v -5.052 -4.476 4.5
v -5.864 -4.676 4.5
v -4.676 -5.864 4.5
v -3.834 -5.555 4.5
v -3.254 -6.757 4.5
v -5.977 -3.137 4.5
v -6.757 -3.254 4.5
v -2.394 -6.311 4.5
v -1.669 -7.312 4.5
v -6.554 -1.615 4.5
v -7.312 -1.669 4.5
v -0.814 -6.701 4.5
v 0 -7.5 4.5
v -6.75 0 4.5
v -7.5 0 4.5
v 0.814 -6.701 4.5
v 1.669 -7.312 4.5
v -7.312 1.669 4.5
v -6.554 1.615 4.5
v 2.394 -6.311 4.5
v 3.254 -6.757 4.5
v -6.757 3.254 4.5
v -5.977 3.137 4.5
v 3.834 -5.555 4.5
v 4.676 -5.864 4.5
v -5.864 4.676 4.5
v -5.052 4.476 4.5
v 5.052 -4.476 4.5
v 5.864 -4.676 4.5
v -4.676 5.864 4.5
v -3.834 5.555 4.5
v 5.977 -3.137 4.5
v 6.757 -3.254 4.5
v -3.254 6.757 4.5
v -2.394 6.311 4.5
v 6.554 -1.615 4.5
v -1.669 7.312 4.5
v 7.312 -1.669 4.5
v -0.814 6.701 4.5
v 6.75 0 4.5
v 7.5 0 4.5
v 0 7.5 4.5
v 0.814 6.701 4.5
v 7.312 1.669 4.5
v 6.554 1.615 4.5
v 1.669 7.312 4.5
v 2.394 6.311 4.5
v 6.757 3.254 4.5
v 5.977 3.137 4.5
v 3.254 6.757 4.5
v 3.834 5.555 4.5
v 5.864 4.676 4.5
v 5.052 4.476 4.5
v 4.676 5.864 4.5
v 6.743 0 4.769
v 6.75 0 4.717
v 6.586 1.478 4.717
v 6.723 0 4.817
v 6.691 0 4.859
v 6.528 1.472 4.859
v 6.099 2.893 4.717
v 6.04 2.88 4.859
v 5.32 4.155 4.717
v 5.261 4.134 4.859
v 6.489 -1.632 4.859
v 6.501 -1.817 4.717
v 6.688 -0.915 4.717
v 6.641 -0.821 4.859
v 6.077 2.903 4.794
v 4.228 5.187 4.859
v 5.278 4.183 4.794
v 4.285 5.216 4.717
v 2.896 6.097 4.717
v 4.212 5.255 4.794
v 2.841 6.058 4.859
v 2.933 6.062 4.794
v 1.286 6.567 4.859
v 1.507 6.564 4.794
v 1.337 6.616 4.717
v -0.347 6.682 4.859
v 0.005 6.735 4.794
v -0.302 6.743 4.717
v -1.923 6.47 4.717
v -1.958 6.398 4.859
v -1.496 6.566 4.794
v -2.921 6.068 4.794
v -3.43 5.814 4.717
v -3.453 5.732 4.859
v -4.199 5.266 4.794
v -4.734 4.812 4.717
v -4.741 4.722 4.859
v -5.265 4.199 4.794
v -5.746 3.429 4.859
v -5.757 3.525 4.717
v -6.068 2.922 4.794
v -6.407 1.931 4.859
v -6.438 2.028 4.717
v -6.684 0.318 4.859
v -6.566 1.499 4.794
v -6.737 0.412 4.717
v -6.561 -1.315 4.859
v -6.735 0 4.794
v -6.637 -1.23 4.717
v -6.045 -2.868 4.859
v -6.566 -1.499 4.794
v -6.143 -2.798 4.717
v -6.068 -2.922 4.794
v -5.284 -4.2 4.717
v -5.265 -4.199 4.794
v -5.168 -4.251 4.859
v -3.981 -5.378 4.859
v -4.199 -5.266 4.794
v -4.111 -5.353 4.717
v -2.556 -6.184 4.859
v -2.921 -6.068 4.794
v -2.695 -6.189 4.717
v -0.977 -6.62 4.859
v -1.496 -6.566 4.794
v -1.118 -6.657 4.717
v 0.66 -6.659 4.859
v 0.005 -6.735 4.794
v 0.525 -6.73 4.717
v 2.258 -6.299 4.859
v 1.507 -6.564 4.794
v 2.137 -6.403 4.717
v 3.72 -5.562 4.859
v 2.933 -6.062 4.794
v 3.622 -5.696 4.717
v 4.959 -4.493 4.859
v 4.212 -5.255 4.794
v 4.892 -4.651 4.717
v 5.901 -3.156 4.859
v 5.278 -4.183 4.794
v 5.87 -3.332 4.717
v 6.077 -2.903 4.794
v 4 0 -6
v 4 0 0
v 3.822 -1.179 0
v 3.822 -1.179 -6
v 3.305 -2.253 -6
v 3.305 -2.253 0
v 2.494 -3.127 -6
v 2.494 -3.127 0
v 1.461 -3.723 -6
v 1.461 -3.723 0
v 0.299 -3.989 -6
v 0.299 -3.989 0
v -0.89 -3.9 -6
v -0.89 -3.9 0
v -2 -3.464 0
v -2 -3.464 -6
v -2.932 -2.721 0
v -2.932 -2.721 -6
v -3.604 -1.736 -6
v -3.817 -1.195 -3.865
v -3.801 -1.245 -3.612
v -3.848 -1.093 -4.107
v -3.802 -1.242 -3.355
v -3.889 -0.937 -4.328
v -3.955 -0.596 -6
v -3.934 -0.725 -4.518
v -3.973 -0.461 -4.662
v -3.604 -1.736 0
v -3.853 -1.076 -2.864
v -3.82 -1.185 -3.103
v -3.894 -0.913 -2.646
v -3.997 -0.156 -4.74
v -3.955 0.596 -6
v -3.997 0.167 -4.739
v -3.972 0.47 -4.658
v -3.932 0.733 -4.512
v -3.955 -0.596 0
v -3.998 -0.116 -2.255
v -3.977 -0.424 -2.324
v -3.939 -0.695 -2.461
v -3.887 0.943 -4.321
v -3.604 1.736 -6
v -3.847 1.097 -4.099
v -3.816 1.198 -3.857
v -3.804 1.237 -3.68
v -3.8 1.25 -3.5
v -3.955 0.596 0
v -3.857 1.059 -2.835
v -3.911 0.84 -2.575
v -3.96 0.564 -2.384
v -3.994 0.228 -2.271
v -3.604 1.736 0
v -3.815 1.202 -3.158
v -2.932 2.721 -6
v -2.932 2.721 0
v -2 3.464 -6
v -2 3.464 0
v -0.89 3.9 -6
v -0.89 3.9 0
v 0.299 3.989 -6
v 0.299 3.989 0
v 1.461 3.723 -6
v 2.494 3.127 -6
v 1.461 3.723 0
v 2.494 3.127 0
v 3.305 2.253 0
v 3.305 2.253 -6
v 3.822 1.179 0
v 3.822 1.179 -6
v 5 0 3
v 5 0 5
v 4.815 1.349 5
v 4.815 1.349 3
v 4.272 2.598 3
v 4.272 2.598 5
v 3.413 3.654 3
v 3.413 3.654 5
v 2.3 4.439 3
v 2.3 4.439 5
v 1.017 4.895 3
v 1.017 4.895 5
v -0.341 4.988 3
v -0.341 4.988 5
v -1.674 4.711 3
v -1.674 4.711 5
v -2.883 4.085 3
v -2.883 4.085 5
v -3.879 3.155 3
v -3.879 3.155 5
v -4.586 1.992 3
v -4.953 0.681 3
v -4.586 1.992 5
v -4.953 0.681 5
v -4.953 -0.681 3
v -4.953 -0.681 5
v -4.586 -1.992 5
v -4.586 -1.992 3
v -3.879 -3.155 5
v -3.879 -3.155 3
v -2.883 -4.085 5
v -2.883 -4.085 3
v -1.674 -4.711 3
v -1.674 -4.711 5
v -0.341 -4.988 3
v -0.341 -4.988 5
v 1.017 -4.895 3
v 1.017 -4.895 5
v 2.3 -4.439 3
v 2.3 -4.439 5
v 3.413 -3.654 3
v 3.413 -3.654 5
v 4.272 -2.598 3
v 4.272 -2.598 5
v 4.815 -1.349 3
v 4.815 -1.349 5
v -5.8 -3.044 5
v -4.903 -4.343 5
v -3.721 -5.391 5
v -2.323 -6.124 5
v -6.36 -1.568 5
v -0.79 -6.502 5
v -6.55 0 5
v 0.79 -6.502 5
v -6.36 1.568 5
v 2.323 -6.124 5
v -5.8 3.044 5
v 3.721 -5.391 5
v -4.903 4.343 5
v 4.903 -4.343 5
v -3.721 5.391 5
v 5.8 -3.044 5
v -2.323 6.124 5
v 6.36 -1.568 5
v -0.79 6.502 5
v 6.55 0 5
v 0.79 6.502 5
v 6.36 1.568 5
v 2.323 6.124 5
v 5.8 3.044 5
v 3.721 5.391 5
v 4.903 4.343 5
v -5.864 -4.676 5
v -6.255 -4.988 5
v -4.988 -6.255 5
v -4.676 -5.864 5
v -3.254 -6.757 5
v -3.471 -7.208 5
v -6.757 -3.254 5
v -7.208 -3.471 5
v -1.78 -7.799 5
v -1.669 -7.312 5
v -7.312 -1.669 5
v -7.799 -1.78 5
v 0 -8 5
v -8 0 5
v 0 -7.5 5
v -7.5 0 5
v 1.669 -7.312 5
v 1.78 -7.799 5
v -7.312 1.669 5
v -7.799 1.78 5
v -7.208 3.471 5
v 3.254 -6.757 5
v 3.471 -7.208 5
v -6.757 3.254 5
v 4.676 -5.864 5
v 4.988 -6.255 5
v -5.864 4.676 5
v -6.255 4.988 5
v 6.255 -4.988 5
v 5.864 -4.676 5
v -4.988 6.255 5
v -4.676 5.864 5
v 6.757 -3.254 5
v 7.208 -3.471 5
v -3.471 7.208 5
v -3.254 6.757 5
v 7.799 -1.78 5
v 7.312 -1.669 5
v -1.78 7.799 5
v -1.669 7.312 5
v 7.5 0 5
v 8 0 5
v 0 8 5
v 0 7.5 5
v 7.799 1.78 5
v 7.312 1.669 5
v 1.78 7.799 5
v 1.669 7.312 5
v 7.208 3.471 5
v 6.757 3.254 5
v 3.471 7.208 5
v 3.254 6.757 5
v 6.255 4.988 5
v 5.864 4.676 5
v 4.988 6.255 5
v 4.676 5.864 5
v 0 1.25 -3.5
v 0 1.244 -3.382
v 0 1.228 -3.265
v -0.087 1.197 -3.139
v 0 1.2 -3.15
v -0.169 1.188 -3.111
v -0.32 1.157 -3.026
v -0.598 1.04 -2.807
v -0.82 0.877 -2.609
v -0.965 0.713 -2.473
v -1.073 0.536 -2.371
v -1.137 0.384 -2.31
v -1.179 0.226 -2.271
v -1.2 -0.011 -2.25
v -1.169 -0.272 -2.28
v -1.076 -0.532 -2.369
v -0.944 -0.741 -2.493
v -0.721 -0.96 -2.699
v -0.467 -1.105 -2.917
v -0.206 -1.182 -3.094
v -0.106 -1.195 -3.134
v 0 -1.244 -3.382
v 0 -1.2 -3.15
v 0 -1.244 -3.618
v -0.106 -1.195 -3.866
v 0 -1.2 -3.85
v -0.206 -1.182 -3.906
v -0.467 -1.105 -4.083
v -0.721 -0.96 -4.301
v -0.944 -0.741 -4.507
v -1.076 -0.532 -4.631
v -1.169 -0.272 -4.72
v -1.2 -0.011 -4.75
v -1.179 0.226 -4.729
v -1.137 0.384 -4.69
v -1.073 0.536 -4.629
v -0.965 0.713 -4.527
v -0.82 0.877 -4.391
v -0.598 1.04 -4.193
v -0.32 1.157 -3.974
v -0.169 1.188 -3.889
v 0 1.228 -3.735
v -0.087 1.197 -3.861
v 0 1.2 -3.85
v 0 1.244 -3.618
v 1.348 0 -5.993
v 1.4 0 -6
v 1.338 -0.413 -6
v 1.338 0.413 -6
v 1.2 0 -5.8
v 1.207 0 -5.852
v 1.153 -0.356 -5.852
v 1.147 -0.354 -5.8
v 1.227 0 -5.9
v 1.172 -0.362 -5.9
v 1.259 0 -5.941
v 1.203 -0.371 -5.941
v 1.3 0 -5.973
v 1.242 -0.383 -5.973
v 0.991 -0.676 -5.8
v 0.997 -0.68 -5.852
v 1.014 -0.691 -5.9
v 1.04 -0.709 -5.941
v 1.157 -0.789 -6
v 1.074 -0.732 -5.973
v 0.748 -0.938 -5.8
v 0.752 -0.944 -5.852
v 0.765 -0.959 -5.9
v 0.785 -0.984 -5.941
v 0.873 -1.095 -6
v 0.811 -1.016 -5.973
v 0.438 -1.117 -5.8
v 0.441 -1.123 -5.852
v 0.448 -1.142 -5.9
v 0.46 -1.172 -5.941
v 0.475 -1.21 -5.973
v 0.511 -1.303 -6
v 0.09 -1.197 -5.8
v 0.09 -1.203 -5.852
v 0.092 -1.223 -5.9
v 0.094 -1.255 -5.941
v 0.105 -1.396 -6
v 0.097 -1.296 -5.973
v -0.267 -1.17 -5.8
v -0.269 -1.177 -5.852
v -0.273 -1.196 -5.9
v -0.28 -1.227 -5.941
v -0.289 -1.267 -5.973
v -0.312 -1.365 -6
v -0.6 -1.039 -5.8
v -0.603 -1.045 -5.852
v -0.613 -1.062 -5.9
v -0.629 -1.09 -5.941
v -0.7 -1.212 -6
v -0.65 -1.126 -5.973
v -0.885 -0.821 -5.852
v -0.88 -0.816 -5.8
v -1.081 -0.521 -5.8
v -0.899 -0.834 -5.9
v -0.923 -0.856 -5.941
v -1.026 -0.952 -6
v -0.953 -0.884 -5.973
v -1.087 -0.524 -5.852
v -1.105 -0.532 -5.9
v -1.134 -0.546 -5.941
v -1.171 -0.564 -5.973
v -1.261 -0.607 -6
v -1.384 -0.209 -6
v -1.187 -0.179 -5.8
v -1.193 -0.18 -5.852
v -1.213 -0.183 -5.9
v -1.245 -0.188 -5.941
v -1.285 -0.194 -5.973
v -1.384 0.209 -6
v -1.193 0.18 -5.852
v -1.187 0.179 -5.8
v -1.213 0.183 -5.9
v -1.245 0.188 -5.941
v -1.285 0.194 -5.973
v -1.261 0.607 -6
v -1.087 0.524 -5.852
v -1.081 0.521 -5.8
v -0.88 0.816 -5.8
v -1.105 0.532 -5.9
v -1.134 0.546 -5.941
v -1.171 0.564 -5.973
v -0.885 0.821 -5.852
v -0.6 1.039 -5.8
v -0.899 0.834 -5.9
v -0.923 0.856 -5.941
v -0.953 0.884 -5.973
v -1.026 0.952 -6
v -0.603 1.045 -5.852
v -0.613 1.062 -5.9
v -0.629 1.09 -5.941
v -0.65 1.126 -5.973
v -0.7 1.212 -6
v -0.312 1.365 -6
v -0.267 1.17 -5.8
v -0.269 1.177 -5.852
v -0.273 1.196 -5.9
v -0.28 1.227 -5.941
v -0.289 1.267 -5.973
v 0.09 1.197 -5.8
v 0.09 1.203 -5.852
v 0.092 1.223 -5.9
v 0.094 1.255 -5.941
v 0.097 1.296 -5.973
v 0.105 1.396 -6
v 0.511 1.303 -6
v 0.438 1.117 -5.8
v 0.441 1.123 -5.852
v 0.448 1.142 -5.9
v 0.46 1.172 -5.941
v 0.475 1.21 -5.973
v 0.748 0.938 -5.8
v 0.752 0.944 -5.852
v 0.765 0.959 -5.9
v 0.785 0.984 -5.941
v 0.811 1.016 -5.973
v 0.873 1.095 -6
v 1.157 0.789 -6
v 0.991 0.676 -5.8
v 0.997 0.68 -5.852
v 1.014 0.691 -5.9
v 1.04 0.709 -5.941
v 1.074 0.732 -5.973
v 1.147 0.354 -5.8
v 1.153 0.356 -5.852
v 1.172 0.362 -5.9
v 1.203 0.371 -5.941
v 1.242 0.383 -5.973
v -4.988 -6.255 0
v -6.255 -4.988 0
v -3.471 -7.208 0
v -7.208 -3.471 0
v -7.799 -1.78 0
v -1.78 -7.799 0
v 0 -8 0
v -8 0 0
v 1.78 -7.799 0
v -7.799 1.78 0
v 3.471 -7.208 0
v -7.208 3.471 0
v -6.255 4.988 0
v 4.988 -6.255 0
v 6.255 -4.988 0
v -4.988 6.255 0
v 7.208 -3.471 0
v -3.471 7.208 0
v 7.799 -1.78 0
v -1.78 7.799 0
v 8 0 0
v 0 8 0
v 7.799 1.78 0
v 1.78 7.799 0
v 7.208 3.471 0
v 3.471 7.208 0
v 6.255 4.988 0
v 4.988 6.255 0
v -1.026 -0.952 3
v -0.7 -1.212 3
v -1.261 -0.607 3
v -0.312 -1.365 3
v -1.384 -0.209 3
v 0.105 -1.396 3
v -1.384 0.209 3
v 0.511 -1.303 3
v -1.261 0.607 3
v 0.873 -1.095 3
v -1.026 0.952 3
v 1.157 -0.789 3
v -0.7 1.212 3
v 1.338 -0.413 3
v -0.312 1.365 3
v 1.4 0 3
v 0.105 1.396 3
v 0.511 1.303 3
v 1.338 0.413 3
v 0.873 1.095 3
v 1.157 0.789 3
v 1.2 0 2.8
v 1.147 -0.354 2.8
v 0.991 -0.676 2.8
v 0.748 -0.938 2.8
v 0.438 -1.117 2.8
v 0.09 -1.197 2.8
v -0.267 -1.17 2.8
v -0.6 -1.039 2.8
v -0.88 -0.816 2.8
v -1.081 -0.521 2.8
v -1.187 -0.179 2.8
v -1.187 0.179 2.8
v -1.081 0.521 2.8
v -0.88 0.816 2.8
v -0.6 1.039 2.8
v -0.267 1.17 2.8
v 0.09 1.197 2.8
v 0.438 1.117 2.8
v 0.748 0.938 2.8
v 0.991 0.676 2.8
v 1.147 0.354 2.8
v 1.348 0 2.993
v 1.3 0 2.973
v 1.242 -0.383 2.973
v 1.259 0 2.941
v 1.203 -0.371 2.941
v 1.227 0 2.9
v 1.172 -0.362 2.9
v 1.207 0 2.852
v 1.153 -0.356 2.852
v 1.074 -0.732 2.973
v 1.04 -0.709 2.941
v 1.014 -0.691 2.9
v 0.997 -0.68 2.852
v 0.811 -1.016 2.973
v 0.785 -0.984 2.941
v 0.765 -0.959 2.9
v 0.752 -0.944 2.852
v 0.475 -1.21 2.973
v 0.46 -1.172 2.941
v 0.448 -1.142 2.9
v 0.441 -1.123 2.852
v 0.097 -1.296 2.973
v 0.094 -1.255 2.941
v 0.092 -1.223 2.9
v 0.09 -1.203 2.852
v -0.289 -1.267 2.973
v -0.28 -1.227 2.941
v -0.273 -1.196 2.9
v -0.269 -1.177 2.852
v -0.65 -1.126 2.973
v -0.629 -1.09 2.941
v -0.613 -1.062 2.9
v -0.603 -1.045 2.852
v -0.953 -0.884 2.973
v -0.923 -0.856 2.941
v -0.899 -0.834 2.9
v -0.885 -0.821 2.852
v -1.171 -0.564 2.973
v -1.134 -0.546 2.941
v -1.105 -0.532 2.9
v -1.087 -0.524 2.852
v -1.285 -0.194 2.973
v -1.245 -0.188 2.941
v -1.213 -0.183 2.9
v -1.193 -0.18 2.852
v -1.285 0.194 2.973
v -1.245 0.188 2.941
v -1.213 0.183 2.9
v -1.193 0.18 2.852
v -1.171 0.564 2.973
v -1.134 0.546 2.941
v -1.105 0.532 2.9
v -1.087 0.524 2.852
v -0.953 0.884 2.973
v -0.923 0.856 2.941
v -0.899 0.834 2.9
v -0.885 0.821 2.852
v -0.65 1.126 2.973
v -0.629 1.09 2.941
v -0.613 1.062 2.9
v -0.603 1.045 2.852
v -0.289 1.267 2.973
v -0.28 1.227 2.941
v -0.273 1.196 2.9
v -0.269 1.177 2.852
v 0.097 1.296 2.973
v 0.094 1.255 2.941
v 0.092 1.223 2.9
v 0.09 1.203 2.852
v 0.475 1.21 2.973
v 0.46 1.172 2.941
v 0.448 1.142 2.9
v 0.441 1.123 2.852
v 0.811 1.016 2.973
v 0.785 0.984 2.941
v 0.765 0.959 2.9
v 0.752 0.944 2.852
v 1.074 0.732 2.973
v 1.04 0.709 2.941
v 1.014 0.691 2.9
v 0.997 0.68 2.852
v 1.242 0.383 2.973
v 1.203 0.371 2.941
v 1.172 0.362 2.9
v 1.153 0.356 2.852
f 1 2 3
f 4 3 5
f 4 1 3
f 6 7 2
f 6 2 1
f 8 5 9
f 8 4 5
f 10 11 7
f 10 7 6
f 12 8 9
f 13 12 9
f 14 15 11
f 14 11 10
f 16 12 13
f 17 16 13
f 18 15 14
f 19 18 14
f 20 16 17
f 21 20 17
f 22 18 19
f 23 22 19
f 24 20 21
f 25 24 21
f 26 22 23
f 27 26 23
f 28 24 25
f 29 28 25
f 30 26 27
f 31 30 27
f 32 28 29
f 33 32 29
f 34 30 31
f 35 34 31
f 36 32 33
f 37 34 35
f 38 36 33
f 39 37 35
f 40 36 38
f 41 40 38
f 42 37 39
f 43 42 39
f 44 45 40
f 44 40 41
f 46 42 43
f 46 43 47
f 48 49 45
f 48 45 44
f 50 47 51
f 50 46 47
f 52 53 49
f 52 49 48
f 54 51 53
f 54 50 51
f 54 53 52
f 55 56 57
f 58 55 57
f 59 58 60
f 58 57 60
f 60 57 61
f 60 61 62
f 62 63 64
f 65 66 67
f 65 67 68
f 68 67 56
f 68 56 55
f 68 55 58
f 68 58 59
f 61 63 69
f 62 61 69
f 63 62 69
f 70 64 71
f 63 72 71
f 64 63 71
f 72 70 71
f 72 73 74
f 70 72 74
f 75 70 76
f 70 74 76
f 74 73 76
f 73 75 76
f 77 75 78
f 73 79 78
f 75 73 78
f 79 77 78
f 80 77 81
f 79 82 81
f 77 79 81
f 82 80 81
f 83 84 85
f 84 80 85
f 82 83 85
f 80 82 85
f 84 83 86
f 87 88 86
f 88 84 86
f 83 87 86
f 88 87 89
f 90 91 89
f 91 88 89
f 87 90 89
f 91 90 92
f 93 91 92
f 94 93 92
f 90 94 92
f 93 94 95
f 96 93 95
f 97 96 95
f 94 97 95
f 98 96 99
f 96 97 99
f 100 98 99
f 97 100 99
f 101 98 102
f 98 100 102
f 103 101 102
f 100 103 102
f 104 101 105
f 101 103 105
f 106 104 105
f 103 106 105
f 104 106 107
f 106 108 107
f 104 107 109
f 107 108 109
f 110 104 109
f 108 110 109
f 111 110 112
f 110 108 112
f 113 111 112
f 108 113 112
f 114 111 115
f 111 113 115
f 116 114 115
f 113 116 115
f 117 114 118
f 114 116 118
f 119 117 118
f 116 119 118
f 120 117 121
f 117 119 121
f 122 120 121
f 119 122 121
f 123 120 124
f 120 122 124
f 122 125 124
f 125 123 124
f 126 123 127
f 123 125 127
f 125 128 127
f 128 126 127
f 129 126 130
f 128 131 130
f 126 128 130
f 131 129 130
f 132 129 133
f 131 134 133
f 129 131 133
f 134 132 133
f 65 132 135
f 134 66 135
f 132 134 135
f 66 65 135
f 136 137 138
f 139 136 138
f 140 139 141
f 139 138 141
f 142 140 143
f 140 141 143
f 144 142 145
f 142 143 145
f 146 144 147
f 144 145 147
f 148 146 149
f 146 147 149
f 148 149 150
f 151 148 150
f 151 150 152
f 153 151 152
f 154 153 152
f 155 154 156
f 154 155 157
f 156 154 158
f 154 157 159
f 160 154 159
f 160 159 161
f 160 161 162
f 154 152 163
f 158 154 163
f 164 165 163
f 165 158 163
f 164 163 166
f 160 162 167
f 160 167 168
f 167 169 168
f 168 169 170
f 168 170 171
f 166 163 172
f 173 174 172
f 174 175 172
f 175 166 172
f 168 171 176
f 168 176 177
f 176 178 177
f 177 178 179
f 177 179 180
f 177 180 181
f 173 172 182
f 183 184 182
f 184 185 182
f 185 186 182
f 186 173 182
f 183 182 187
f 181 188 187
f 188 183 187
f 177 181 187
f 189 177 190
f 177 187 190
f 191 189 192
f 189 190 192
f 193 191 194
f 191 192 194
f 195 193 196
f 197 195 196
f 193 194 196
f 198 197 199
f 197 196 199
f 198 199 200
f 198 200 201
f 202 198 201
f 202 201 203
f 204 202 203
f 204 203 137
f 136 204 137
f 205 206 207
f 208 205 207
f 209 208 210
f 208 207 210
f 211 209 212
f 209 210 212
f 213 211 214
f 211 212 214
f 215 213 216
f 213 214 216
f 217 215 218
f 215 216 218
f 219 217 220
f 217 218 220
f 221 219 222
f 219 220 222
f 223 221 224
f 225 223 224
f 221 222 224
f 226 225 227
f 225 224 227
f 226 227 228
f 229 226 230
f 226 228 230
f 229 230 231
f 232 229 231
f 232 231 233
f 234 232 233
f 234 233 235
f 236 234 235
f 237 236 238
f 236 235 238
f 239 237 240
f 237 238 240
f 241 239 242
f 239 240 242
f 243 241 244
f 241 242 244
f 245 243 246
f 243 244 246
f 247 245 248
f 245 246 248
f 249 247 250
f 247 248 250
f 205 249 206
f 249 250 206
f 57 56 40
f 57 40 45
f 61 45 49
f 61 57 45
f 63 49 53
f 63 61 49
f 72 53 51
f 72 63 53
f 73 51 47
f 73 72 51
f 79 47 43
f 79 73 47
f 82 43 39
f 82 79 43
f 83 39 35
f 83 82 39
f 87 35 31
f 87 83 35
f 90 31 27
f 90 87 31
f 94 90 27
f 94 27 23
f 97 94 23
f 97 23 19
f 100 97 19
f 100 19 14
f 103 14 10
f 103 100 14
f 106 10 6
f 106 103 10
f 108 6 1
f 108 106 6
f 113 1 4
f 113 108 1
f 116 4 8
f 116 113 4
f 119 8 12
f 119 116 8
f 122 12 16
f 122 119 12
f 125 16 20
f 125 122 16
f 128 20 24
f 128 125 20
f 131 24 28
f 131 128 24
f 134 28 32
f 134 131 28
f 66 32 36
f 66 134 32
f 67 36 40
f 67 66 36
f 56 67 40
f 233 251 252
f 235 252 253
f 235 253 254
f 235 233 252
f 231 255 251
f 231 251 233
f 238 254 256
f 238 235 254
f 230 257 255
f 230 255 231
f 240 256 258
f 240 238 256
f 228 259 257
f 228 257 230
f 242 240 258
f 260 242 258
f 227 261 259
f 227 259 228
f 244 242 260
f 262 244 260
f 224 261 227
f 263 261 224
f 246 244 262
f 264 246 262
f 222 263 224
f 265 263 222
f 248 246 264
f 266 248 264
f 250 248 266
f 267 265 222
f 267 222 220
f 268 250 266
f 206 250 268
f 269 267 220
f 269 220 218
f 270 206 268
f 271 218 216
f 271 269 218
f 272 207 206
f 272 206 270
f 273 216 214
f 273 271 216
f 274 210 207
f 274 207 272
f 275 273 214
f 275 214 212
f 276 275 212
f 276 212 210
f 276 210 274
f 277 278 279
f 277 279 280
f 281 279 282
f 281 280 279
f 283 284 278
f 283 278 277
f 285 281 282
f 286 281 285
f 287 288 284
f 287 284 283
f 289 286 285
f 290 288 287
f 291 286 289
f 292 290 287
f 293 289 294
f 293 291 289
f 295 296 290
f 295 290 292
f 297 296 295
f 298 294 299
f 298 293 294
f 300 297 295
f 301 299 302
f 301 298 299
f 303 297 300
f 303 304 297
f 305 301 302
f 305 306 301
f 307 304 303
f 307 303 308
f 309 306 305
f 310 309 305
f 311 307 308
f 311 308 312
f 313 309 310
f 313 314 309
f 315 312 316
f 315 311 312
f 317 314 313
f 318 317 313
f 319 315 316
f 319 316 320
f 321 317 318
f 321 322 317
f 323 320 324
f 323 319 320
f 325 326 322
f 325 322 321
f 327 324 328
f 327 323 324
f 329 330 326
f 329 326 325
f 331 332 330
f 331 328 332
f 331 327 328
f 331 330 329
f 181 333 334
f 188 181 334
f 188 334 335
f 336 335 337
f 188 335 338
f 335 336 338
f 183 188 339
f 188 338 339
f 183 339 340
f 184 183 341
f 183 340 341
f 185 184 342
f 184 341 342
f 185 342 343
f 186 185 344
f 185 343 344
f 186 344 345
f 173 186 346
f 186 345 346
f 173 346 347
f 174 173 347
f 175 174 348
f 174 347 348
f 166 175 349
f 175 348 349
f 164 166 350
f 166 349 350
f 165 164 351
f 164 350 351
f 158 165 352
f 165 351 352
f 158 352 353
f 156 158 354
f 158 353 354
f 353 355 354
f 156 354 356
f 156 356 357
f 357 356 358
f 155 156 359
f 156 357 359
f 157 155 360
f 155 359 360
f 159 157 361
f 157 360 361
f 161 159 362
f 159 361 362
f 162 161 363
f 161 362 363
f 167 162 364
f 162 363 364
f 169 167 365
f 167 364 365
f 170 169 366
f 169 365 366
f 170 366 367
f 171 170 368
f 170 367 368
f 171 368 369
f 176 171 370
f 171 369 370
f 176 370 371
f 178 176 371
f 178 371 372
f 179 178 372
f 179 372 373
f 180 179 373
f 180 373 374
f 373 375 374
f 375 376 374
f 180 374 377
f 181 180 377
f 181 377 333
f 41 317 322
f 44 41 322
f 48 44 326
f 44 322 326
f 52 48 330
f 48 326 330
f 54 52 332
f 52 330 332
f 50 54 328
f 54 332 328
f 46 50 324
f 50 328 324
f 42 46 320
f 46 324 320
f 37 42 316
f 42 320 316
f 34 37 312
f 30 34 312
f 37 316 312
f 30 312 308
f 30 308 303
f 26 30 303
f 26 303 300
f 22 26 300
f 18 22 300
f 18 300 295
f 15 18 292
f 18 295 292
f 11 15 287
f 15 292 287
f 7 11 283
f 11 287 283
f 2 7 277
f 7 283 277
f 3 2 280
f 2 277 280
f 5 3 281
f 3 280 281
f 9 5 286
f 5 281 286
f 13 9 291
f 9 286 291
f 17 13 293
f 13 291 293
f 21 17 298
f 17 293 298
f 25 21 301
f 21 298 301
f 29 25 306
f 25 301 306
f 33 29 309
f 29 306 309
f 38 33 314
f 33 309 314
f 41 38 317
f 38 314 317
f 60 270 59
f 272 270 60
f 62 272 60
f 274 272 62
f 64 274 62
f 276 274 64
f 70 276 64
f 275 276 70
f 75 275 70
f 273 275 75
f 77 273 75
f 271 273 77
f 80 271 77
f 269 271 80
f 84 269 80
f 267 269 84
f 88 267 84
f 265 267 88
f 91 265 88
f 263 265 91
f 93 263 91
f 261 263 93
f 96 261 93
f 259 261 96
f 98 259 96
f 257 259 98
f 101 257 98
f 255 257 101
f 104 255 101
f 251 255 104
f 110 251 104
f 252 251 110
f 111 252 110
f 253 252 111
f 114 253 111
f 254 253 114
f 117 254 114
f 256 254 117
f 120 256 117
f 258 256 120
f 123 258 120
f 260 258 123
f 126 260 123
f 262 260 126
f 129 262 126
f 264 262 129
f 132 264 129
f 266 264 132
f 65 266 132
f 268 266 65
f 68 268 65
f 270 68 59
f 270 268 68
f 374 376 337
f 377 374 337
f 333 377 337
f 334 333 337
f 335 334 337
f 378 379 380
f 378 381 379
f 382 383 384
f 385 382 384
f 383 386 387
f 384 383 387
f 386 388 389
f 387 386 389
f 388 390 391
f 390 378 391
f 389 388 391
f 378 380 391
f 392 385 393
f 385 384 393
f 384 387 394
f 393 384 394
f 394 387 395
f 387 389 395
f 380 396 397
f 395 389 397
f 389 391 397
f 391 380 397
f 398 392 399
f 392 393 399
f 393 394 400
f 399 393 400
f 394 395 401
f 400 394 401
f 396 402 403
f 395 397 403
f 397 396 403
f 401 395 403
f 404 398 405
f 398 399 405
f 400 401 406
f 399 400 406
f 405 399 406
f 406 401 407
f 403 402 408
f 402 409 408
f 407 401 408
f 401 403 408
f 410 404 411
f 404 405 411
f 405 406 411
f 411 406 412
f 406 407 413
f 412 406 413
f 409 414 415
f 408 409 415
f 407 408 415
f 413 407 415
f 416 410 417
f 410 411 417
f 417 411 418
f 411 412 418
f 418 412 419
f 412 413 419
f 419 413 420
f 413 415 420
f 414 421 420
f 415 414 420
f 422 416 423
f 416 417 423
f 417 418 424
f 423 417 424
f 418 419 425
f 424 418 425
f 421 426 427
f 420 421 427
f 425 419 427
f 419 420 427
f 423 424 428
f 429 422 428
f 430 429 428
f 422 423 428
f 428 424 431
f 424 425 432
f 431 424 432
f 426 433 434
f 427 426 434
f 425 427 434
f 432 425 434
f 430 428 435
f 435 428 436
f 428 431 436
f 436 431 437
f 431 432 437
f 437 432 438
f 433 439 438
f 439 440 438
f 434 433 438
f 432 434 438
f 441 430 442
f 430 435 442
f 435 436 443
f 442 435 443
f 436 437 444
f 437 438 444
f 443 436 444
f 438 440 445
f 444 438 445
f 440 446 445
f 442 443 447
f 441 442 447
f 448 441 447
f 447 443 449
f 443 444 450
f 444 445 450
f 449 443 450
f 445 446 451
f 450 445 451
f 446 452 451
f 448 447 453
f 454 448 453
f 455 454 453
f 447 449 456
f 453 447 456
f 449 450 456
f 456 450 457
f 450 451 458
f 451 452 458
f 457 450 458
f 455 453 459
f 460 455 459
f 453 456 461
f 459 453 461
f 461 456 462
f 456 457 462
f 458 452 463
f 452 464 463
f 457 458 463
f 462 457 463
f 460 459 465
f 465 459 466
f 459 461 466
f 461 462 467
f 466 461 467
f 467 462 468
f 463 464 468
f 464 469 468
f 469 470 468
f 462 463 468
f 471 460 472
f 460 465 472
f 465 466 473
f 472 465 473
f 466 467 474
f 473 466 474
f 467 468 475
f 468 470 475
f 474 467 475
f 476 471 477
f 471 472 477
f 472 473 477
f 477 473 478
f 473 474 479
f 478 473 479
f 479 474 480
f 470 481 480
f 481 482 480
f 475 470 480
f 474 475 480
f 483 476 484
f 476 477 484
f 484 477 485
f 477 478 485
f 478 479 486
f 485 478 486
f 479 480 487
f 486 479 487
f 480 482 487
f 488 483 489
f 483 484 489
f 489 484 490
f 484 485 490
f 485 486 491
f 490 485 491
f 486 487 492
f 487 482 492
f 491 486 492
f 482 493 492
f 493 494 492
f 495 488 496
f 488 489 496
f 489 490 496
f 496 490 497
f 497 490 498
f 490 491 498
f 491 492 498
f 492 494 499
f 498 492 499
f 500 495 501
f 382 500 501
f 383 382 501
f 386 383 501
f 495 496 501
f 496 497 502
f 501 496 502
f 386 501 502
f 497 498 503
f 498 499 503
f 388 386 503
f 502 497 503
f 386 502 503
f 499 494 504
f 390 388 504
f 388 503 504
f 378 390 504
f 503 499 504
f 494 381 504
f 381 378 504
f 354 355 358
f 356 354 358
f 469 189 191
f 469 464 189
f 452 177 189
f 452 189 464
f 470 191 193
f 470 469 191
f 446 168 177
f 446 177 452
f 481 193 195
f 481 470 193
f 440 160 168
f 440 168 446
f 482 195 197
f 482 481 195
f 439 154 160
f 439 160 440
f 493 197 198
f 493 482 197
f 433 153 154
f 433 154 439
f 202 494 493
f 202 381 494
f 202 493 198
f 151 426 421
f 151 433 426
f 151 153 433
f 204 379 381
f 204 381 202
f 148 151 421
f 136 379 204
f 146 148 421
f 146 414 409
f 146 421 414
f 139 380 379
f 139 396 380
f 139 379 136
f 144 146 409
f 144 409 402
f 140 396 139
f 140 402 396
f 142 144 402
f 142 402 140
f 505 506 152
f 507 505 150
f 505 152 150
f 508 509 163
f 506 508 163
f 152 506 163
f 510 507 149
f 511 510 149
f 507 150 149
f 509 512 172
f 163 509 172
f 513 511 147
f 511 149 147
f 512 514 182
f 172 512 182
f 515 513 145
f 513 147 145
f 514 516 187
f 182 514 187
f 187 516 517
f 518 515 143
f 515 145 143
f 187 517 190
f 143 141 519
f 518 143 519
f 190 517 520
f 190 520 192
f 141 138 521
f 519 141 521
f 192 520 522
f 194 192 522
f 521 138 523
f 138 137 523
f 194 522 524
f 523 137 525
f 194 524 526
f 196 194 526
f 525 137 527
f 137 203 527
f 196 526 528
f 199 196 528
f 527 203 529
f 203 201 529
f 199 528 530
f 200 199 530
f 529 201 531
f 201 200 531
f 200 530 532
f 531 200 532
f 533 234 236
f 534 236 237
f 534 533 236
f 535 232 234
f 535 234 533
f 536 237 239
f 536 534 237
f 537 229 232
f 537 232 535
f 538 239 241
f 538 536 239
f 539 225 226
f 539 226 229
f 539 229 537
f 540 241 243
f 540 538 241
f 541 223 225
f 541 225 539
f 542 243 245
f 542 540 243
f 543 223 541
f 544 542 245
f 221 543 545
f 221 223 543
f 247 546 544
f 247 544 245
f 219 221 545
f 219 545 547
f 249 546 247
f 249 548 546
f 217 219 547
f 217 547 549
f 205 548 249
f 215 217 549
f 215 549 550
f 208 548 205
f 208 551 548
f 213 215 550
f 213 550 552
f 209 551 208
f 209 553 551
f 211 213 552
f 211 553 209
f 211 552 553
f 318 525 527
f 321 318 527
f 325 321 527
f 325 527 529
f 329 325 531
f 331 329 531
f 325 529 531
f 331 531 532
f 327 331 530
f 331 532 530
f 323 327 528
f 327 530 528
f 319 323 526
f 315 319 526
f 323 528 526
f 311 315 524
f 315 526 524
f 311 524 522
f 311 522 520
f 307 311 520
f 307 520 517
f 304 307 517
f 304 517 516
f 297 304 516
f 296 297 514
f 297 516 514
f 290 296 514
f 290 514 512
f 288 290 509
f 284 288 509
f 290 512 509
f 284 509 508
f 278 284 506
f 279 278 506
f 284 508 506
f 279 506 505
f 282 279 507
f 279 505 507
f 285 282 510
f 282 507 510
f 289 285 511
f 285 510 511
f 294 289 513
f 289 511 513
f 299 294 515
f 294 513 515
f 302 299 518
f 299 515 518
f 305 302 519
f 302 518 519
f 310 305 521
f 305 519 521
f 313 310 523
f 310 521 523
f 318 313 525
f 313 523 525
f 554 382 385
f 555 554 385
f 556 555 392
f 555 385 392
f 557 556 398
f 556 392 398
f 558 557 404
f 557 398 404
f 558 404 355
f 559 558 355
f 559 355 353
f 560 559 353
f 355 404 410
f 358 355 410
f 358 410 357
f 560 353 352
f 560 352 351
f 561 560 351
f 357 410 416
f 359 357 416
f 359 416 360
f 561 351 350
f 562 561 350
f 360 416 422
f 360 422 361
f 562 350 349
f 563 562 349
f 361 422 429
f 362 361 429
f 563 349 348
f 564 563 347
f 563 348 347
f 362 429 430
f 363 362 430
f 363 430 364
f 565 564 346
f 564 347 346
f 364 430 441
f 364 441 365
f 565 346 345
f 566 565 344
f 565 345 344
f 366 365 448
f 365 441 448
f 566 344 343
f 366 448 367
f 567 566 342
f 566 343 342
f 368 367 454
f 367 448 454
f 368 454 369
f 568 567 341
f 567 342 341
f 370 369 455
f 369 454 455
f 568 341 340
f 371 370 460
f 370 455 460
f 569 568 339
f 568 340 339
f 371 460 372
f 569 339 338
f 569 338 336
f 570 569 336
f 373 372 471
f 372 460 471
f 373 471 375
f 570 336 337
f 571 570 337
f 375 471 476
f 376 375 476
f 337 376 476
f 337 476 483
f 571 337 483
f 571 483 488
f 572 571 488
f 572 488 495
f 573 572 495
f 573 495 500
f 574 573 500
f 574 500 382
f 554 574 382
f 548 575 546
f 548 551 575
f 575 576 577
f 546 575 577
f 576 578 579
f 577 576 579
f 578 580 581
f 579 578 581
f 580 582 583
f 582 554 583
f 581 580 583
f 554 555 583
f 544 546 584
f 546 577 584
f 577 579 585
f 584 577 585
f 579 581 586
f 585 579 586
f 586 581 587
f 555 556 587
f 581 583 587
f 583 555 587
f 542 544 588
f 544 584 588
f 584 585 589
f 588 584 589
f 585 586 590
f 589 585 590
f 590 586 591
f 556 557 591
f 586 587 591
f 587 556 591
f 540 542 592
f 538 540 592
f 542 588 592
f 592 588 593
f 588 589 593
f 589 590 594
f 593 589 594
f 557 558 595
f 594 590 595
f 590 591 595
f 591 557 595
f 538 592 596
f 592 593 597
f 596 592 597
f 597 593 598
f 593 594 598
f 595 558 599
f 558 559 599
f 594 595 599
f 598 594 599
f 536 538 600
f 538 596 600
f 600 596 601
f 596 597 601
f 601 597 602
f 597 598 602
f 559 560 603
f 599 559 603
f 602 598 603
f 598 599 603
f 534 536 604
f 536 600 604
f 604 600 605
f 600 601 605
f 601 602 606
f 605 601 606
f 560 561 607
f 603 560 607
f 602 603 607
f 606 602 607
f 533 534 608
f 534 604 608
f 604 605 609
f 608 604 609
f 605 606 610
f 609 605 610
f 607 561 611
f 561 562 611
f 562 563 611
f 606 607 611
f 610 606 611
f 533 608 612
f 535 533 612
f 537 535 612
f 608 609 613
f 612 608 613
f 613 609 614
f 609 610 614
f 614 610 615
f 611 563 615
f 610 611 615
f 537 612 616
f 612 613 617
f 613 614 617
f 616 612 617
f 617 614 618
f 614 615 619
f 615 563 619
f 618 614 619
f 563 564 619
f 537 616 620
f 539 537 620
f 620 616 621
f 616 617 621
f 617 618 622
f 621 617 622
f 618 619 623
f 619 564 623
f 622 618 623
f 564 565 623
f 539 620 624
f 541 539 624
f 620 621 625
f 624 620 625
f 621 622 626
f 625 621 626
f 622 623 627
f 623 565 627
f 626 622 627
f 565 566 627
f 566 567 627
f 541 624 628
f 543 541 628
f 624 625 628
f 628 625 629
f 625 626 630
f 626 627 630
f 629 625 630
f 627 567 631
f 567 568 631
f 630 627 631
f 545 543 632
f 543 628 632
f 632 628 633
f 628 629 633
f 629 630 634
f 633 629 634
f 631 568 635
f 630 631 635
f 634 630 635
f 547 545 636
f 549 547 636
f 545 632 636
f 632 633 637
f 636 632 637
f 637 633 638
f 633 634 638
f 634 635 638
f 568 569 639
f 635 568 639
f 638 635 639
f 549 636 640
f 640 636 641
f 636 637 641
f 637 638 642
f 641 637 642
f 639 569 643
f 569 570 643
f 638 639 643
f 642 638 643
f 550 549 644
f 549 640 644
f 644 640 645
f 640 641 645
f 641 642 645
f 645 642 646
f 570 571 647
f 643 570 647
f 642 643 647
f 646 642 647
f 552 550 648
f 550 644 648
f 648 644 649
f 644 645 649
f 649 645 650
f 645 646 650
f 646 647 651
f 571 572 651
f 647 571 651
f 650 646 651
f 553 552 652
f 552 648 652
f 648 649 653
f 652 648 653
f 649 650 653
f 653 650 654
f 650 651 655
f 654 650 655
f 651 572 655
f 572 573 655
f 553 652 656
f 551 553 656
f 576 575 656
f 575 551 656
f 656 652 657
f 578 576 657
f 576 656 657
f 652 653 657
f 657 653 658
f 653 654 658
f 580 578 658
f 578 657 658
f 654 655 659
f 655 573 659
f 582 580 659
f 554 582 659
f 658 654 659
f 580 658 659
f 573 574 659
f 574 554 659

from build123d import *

# Parameters (mm, degrees)
F0_R      = 8
F1_DEPTH  = 5
F2_R      = 4
F3_DEPTH  = 6
F4_R      = 1.2
F5_DEPTH  = 9
F6_R      = 5
F7_DEPTH  = 2
F8_R      = 7.5
F8_R_2    = 6.75
F9_DEPTH  = 0.5
F10_SIZE  = 0.2
F11_R     = 0.2
F13_R     = 1.25
F14_DEPTH = 4.5


with BuildPart() as f1:
    # F0 (on Top) → F1 (new body)
    with BuildSketch(Plane.XY):
        Circle(F0_R)
    extrude(amount=F1_DEPTH)

    # F2 (on face) → F3 (join)
    with BuildSketch(Plane(origin=(0, 0, 0), x_dir=(1, 0, 0), z_dir=(0, 0, -1))):
        Circle(F2_R)
    extrude(amount=F3_DEPTH)

    # F4 (on face) → F5 (cut)
    with BuildSketch(Plane(origin=(0, 0, -6), x_dir=(1, 0, 0), z_dir=(0, 0, -1))):
        Circle(F4_R)
    extrude(amount=-F5_DEPTH, mode=Mode.SUBTRACT)

    # F6 (on face) → F7 (cut)
    with BuildSketch(Plane.XY.offset(5)):
        Circle(F6_R)
    extrude(amount=-F7_DEPTH, mode=Mode.SUBTRACT)

    # F8 (on face) → F9 (cut)
    with BuildSketch(Plane.XY.offset(5)):
        Circle(F8_R)
        Circle(F8_R_2, mode=Mode.SUBTRACT)
    extrude(amount=-F9_DEPTH, mode=Mode.SUBTRACT)

    # F10
    f10_edges = [f1.edges().sort_by_distance(p)[0] for p in [
        (-6.75, 0, 5),
    ]]
    chamfer(f10_edges, length=F10_SIZE)

    # F11
    f11_edges = [f1.edges().sort_by_distance(p)[0] for p in [
        (-6.75, 0, 4.8),
        (-1.2, 0, 3),
        (-1.2, 0, -6),
    ]]
    fillet(f11_edges, radius=F11_R)

    # F13 (on Right) → F14 (cut)
    with BuildSketch(Plane.YZ):
        with Locations((0, -3.5)):
            Circle(F13_R)
    extrude(amount=-F14_DEPTH, mode=Mode.SUBTRACT)


solid = f1.part
